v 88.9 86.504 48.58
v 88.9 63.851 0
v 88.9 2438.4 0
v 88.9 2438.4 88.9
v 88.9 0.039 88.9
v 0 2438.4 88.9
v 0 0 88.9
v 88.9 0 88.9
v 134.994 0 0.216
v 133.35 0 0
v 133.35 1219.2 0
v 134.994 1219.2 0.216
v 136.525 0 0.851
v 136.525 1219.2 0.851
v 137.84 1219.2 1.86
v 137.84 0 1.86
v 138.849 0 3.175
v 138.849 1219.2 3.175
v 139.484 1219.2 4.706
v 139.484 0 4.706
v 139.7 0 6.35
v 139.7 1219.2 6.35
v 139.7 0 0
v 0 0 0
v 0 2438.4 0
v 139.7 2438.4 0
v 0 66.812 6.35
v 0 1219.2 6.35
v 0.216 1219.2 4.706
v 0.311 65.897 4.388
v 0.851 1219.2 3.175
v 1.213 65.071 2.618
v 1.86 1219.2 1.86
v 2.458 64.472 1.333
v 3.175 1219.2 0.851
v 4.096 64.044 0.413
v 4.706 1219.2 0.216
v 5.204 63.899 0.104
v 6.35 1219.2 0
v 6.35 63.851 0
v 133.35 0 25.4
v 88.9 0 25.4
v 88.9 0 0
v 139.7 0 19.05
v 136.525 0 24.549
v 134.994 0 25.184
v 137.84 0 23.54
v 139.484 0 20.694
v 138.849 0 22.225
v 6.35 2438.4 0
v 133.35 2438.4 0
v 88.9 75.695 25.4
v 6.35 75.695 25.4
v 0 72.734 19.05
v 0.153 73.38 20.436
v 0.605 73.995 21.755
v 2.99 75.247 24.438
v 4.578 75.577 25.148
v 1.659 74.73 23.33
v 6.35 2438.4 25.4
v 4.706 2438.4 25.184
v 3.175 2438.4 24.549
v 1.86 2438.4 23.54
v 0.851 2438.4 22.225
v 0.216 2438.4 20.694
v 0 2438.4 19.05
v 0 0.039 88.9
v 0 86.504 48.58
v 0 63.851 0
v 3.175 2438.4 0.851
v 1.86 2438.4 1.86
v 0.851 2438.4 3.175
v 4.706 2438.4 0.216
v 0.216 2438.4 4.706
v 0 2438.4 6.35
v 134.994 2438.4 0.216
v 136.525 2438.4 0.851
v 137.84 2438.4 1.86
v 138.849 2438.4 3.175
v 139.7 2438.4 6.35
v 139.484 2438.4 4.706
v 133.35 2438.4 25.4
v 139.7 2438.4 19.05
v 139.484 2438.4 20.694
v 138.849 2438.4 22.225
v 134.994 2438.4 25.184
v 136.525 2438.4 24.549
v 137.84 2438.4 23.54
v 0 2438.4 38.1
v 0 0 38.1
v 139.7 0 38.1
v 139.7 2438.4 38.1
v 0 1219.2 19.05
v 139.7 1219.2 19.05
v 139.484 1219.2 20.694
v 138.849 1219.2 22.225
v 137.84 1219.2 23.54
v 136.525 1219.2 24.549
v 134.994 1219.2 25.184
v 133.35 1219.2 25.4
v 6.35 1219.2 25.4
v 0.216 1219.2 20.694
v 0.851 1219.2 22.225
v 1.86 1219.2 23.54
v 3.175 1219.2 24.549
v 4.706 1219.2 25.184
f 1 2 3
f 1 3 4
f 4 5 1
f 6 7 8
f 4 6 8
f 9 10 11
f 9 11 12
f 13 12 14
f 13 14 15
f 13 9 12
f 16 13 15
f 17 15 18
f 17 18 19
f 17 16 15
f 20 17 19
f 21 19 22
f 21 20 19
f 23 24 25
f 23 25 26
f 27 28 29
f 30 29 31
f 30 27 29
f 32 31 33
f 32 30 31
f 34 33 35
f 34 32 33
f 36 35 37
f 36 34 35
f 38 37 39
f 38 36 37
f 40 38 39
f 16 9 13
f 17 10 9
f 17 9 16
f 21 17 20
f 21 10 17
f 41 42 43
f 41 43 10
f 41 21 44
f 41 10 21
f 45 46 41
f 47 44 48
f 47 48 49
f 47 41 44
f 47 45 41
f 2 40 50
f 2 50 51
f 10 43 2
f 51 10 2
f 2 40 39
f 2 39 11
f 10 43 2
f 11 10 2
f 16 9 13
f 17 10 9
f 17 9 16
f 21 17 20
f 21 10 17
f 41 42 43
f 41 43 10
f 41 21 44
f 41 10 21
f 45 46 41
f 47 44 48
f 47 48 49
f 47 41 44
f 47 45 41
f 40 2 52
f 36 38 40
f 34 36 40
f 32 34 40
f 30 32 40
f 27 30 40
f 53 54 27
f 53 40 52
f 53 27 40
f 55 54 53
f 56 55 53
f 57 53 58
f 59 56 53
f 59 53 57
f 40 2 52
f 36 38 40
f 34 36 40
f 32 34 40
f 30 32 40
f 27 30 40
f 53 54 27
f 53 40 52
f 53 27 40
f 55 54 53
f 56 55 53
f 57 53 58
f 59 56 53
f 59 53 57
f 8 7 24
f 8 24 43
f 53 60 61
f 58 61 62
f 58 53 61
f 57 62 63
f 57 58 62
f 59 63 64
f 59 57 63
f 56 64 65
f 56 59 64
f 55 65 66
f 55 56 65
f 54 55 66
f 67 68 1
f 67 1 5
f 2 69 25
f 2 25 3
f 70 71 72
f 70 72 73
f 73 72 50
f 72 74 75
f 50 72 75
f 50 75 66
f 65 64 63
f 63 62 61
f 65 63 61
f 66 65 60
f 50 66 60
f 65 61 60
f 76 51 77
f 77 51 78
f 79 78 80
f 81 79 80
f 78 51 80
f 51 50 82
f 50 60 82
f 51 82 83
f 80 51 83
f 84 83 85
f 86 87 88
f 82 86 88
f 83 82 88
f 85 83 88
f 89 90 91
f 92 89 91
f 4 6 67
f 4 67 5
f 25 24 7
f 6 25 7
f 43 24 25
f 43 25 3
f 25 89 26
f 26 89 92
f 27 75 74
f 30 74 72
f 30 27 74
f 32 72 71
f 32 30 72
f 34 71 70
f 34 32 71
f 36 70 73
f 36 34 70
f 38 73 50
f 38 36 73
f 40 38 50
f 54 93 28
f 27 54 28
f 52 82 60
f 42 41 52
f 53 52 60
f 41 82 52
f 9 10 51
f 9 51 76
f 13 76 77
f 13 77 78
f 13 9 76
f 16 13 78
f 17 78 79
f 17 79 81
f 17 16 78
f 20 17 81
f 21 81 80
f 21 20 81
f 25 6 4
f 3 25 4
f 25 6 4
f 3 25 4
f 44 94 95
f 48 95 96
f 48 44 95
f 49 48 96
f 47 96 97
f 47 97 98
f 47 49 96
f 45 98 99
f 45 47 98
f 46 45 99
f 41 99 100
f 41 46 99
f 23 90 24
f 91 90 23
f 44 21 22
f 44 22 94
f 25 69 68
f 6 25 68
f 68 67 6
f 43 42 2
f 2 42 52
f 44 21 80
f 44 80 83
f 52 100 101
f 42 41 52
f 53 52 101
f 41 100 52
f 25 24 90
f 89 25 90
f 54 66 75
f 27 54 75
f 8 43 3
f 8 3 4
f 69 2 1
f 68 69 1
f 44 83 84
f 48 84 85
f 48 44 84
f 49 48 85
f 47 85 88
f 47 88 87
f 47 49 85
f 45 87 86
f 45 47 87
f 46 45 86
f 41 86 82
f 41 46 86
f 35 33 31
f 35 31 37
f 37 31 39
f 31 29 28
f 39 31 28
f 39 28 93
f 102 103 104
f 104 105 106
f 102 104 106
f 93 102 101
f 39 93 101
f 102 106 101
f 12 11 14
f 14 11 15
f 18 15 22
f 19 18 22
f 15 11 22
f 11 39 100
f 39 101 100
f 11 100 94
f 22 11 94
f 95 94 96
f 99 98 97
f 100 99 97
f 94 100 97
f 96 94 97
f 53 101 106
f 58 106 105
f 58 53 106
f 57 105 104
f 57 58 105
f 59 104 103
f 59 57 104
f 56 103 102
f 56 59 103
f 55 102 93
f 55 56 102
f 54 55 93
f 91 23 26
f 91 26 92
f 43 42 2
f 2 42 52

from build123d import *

# Parameters (mm, degrees)
F0_W     = 88.9
F0_H     = 88.9
F1_DEPTH = 2438.4
F3_DEPTH = 1219.2
F4_DEPTH = 2438.4
F6_DEPTH = 88.9
F7_DEPTH = 2438.4
F8_W     = 139.7
F8_H     = 38.1
F9_DEPTH = 2438.4


with BuildPart() as f1:
    # F0 (on Front) → F1 (new body)
    with BuildSketch(Plane.XZ):
        with Locations((44.45, 44.45)):
            Rectangle(F0_W, F0_H)
    extrude(amount=-F1_DEPTH)


with BuildPart() as f3:
    # F2 (on Front) → F3 (new body)
    with BuildSketch(Plane.XZ):
        with BuildLine():
            ThreePointArc((0, 6.35), (1.859872, 1.859872), (6.35, 0))
            Line((6.35, 0), (133.35, 0))
            ThreePointArc((133.35, 0), (137.840128, 1.859872), (139.7, 6.35))
            Line((139.7, 6.35), (139.7, 19.05))
            ThreePointArc((139.7, 19.05), (137.840128, 23.540128), (133.35, 25.4))
            Line((133.35, 25.4), (6.35, 25.4))
            ThreePointArc((6.35, 25.4), (1.859872, 23.540128), (0, 19.05))
            Line((0, 19.05), (0, 6.35))
        make_face()
    extrude(amount=-F3_DEPTH)


with BuildPart() as f4:
    # F2 (on Front) → F4 (new body)
    with BuildSketch(Plane.XZ):
        with BuildLine():
            ThreePointArc((0, 6.35), (1.859872, 1.859872), (6.35, 0))
            Line((6.35, 0), (133.35, 0))
            ThreePointArc((133.35, 0), (137.840128, 1.859872), (139.7, 6.35))
            Line((139.7, 6.35), (139.7, 19.05))
            ThreePointArc((139.7, 19.05), (137.840128, 23.540128), (133.35, 25.4))
            Line((133.35, 25.4), (6.35, 25.4))
            ThreePointArc((6.35, 25.4), (1.859872, 23.540128), (0, 19.05))
            Line((0, 19.05), (0, 6.35))
        make_face()
    extrude(amount=-F4_DEPTH)


with BuildPart() as f6_tool:
    # F5 (on Right) → F6 (new body, through all)
    with BuildSketch(Plane.YZ):
        Polygon((86.504284, 48.58048), (0, 88.91809), (0, 0), (63.850834, 0), align=None)
    extrude(amount=F6_DEPTH)


with BuildPart() as f1_1:
    add(f1.part)

    # F6: cut by f6_tool
    add(f6_tool.part, mode=Mode.SUBTRACT)


with BuildPart() as f3_1:
    add(f3.part)

    # F6: cut by f6_tool
    add(f6_tool.part, mode=Mode.SUBTRACT)


with BuildPart() as f4_1:
    add(f4.part)

    # F6: cut by f6_tool
    add(f6_tool.part, mode=Mode.SUBTRACT)


with BuildPart() as f7:
    # F0 (on Front) → F7 (new body)
    with BuildSketch(Plane.XZ):
        with Locations((44.45, 44.45)):
            Rectangle(F0_W, F0_H)
    extrude(amount=-F7_DEPTH)


with BuildPart() as f9:
    # F8 (on Front) → F9 (new body)
    with BuildSketch(Plane.XZ):
        with Locations((69.85, 19.05)):
            Rectangle(F8_W, F8_H)
    extrude(amount=-F9_DEPTH)


solid = Compound([f1_1.part, f3_1.part, f4_1.part, f7.part, f9.part])
